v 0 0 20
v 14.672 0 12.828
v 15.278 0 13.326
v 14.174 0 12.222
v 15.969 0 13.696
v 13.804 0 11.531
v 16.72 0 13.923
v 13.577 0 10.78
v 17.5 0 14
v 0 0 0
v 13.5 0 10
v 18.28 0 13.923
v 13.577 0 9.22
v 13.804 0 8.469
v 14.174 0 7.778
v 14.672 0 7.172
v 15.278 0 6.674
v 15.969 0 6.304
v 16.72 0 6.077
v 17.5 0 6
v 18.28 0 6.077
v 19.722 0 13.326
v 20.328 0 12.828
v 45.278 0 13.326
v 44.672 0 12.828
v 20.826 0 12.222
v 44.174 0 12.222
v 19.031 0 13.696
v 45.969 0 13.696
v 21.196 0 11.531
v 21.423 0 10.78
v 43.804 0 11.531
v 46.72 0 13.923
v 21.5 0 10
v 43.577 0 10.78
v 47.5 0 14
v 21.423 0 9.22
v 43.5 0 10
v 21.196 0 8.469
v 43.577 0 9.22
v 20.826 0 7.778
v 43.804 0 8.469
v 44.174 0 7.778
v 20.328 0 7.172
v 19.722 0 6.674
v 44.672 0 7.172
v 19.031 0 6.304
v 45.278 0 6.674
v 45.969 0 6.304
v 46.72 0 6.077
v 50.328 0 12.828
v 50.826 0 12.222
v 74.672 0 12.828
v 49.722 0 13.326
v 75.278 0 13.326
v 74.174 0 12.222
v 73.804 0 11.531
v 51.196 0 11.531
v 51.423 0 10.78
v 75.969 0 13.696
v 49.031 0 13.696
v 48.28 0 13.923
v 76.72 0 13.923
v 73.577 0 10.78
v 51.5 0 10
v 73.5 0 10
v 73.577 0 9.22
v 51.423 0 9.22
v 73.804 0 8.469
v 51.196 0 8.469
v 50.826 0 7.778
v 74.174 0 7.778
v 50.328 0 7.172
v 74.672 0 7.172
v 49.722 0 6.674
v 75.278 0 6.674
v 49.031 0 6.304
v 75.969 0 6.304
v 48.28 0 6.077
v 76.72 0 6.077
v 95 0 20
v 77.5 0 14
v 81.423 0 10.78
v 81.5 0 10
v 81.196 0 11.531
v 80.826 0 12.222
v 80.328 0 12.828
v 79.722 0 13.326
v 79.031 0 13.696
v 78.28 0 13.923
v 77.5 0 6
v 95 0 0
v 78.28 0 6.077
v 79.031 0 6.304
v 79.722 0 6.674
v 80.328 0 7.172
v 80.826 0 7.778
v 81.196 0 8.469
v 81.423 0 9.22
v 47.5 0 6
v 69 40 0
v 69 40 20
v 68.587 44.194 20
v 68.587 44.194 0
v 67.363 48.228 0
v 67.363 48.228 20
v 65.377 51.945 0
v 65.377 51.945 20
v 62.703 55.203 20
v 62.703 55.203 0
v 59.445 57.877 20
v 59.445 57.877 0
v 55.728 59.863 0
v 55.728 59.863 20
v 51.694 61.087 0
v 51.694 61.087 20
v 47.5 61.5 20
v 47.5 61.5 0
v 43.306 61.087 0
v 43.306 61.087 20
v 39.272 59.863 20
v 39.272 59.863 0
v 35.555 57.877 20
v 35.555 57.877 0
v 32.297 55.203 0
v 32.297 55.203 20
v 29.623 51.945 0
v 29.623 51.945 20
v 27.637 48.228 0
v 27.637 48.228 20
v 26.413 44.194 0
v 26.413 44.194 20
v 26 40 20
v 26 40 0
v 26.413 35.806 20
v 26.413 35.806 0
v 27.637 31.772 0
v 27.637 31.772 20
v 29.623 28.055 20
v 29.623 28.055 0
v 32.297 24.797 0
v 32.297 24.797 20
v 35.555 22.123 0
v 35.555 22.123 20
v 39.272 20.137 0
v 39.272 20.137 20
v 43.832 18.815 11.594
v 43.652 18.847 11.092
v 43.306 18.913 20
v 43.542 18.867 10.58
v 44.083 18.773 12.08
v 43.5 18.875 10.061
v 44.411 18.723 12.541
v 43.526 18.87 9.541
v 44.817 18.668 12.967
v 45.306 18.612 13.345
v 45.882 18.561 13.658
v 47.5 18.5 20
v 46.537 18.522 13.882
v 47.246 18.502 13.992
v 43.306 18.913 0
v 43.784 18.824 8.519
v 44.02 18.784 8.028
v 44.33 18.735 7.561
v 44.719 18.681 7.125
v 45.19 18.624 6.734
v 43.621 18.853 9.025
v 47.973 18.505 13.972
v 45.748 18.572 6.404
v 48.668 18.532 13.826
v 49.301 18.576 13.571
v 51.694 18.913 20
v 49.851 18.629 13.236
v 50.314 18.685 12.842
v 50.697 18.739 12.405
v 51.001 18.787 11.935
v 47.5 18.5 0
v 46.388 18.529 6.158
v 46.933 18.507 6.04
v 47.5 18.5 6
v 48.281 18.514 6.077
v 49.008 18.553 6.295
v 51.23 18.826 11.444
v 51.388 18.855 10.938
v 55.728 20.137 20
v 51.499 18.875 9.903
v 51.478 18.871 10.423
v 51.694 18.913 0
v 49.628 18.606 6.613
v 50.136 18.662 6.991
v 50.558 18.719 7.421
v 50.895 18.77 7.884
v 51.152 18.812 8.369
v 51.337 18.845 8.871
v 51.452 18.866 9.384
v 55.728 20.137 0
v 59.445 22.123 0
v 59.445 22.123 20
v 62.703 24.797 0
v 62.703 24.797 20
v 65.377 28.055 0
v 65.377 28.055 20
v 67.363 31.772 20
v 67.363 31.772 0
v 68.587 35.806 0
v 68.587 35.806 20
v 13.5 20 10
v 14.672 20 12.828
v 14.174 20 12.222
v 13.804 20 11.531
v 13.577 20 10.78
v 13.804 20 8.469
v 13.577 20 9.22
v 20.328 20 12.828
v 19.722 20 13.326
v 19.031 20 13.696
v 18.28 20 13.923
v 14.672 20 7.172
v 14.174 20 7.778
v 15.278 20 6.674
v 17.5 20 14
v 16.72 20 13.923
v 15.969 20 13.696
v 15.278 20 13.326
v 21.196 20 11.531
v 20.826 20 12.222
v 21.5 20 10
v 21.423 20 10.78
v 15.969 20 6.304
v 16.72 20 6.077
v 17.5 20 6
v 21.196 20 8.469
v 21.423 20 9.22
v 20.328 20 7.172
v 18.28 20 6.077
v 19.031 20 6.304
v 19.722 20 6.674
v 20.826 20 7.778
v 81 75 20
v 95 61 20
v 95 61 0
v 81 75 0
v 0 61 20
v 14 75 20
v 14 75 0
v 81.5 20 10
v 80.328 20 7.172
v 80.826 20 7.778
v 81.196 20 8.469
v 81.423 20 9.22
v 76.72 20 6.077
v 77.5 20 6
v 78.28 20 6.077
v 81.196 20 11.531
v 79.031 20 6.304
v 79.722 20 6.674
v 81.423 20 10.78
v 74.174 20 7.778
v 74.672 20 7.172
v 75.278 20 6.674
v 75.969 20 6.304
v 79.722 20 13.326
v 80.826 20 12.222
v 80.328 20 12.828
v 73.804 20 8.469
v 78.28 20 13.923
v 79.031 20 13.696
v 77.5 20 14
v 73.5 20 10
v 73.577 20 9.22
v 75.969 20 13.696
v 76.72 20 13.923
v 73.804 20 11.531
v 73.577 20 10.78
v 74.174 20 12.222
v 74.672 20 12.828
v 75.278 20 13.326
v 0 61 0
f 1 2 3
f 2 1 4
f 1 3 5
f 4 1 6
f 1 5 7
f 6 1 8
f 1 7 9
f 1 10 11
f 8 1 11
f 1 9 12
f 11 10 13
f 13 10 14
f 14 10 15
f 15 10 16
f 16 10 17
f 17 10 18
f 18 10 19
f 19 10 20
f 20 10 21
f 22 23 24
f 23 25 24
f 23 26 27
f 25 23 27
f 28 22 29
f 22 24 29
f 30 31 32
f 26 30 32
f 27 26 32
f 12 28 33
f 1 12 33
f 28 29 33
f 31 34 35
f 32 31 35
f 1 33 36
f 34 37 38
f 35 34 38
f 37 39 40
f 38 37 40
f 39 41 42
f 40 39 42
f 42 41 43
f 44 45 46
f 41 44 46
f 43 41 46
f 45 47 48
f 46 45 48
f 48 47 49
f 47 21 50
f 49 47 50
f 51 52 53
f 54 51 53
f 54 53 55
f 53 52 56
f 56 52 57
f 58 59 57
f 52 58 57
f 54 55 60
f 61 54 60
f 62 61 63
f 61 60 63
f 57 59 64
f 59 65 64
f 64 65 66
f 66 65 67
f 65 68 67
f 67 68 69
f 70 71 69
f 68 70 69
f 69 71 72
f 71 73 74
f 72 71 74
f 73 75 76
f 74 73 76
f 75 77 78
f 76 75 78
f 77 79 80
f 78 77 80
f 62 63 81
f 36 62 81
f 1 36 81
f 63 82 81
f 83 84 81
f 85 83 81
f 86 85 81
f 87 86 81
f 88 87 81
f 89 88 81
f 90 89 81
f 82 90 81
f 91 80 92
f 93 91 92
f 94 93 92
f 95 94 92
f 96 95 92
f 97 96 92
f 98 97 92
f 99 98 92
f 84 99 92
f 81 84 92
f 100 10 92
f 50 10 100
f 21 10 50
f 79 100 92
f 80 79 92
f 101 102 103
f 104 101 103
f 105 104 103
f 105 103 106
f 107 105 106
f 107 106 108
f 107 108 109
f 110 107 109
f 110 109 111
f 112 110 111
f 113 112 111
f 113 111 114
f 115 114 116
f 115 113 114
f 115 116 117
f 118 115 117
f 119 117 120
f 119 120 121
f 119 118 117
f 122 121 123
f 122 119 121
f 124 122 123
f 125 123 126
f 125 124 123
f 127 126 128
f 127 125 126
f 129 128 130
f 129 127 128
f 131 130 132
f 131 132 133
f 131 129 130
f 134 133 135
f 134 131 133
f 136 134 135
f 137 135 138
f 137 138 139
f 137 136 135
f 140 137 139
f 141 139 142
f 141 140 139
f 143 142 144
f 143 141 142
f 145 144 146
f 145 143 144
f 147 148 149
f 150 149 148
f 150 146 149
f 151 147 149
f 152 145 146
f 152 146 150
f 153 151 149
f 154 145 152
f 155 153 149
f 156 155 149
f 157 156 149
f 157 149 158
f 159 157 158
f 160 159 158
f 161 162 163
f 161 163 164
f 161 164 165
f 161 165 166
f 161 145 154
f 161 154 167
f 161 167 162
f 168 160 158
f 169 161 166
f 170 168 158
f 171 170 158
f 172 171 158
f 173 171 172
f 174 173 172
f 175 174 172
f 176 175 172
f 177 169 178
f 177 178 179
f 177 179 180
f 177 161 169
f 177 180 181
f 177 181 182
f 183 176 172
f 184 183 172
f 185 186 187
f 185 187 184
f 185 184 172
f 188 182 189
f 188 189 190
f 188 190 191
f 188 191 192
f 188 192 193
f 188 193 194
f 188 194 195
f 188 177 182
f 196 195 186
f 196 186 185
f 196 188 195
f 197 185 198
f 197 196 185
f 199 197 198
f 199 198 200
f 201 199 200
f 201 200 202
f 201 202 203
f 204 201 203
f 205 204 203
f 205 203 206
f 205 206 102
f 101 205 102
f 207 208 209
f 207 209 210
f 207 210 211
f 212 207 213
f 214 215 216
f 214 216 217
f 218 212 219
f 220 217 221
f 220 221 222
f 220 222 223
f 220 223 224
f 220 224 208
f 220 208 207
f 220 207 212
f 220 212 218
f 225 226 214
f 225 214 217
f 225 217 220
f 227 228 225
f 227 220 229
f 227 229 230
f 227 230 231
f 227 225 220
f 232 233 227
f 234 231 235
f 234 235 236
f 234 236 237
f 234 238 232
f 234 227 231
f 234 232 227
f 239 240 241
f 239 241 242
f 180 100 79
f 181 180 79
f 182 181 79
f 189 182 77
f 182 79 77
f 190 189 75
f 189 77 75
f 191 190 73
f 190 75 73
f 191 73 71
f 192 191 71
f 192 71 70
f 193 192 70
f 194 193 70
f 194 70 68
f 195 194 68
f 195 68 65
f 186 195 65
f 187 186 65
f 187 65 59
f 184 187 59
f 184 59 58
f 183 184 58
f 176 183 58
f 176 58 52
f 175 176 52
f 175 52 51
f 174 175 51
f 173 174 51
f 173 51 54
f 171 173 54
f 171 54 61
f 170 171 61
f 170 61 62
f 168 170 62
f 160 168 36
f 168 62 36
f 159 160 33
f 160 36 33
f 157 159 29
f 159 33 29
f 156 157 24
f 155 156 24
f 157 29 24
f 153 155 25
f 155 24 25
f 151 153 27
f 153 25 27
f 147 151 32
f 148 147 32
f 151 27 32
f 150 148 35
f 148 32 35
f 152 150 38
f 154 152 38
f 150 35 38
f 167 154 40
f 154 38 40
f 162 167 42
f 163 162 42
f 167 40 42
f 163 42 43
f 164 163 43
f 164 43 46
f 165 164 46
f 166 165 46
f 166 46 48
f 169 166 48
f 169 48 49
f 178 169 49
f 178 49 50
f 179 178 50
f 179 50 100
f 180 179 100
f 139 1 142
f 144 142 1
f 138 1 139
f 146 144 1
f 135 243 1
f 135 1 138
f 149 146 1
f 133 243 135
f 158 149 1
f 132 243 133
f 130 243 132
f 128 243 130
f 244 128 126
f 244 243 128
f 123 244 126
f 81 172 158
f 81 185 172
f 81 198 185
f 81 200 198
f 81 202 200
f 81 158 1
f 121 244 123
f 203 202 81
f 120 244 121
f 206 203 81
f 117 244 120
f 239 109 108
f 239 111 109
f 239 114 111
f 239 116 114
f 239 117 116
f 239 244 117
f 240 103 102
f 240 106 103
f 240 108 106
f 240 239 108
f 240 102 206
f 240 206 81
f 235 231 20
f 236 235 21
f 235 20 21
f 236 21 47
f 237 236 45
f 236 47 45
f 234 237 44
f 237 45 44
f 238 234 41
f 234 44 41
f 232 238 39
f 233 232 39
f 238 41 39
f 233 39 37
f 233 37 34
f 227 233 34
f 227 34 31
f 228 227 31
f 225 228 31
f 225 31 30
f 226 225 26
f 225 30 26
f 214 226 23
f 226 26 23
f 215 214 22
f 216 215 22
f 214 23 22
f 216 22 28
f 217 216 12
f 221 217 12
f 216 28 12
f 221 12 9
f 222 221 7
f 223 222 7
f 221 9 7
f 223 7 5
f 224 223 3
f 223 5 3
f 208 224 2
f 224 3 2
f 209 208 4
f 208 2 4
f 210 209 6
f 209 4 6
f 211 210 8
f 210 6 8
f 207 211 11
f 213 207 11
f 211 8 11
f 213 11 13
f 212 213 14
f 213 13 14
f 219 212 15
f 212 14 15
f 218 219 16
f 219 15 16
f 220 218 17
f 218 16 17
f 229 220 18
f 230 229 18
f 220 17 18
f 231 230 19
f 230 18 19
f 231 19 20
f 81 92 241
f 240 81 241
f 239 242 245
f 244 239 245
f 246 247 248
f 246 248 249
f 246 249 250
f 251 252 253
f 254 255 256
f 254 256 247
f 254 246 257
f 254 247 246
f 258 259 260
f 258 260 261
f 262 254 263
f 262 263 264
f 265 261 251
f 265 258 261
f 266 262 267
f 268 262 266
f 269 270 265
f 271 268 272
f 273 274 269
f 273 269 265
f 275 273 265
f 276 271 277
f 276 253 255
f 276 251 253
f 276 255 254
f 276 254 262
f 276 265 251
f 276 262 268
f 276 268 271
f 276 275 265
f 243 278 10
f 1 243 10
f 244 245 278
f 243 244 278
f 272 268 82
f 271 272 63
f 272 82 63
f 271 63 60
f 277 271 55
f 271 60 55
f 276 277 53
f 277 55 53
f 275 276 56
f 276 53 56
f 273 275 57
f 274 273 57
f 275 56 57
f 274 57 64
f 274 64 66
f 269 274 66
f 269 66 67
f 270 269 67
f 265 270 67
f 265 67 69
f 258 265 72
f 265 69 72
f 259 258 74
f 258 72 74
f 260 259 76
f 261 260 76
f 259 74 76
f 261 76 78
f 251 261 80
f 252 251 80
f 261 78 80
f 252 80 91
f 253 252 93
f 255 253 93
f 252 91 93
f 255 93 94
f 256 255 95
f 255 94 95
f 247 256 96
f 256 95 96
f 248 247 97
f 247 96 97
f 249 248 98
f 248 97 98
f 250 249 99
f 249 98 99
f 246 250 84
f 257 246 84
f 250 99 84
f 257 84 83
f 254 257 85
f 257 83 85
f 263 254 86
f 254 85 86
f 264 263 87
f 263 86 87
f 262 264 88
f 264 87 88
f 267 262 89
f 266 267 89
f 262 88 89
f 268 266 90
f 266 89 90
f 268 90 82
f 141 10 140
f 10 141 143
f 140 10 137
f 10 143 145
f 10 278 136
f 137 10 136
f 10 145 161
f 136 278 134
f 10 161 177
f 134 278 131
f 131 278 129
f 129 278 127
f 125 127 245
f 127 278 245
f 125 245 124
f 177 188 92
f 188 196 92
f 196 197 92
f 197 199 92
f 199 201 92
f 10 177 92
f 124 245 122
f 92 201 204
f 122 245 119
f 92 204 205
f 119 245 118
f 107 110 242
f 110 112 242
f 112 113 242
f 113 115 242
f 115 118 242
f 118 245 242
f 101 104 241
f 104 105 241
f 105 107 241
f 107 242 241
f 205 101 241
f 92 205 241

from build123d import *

# Parameters (mm, degrees)
SCHIZZO1_R                   = 21.5
ESTRUSIONE_ESTRUSIONE1_DEPTH = 20
SCHIZZO2_R                   = 4
TAGLIO_ESTRUSIONE1_DEPTH     = 20


with BuildPart() as part:
    # Schizzo1 → Estrusione-Estrusione1 (new body)
    with BuildSketch(Plane.XY):
        Polygon((0, 0), (95, 0), (95, 61), (81, 75), (14, 75), (0, 61), align=None)
        with Locations((47.5, 40)):
            Circle(SCHIZZO1_R, mode=Mode.SUBTRACT)
    extrude(amount=ESTRUSIONE_ESTRUSIONE1_DEPTH)

    # Schizzo2 → Taglio-Estrusione1 (cut)
    with BuildSketch(Plane.XZ):
        with Locations(Location((47.5, 10, 0), (0, 0, 270))):
            Circle(SCHIZZO2_R)
        with Locations(Location((17.5, 10, 0), (0, 0, 270))):
            Circle(SCHIZZO2_R)
        with Locations(Location((77.5, 10, 0), (0, 0, 90))):
            Circle(SCHIZZO2_R)
    extrude(amount=-TAGLIO_ESTRUSIONE1_DEPTH, mode=Mode.SUBTRACT)


solid = part.part
